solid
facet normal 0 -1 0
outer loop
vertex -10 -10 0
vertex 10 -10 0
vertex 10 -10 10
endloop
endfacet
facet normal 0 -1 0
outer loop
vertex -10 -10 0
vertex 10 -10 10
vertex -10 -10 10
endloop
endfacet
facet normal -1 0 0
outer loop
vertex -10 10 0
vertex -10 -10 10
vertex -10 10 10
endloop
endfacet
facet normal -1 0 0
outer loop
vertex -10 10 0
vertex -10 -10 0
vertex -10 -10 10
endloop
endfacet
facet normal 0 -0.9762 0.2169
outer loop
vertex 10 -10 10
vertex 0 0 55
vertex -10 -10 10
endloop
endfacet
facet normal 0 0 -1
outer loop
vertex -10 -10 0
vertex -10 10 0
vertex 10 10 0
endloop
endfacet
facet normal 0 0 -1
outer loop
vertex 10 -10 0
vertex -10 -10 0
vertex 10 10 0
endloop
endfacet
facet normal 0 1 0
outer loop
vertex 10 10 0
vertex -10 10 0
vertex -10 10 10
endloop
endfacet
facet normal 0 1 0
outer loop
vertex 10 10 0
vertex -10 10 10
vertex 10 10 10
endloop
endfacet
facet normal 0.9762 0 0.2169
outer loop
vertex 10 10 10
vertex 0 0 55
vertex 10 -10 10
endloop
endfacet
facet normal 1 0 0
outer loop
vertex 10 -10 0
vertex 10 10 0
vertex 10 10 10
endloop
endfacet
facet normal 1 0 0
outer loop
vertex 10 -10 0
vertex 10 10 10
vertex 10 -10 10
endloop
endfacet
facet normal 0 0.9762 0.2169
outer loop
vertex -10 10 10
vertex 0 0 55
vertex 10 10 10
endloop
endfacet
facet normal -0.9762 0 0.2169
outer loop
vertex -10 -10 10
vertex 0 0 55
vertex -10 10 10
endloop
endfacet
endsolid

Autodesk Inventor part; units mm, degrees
ref_plane "YZ Plane" through (0, 0, 0) normal (1, 0, 0) x (0, 1, 0)
ref_plane "XZ Plane" through (0, 0, 0) normal (0, 1, 0) x (-1, 0, 0)
ref_plane "XY Plane" through (0, 0, 0) normal (0, 0, 1) x (1, 0, 0)
sketch "Absorber-Base" plane through (0, 0, 0) normal (0, 0, 1) x (1, 0, 0)
  line L0 (-10, 10) -> (10, 10)
  line L1 (10, 10) -> (10, -10)
  line L2 (10, -10) -> (-10, -10)
  line L3 (-10, -10) -> (-10, 10)
  line L4 (-10, 10) -> (10, -10) construction
  line L5 (10, 10) -> (-10, -10) construction
  point P0 (0, 0)
  dimension "d0" = 20
extrude "Gesamtvolumen" add sketch "Absorber-Base" along normal blind 55
sketch "Skizze2" plane through (0, 0, 0) normal (0, 1, 0) x (-1, 0, 0)
  line L0 (-12.9394, 0) -> (12.9394, 0) projected
  line L1 (10, 0) -> (10, 55) projected
  line L2 (-10, 0) -> (-10, 55) projected
  line L3 (10, 0) -> (-10, 0)
  line L4 (-10, 0) -> (-10, 10)
  line L5 (-10, 10) -> (10, 10)
  line L6 (10, 10) -> (10, 0)
  line L7 (-10, 55) -> (10, 55) projected
  line L8 (0, 55) -> (10, 10)
  line L9 (0, 55) -> (-10, 10)
  point P0 (0, 0)
  point P1 (10, 10)
  dimension "d6" = 10
extrude "Cutaway" cut sketch "Skizze2" along normal mid plane 20 contours L2 L7 L9 | L8 L7 L1
pattern_circular "Runde Anordnung1" count 2 over 90 about axis through (0, 0, -10) along (0, 0, 1) of "Cutaway"
equation "\"d0\" = Base_Seitenlänge"
equation "\"d1\" = Gesamthöhe"
equation "\"d6\" = Base_Höhe"
equation "\"d7\" = Base_Seitenlänge"
equation "\"Base_Seitenlänge\" = 20"
equation "\"Base_Höhe\" = 10"
equation "\"Gesamthöhe\" = 55"
properties part number "Absorber - IHF-Mini"
